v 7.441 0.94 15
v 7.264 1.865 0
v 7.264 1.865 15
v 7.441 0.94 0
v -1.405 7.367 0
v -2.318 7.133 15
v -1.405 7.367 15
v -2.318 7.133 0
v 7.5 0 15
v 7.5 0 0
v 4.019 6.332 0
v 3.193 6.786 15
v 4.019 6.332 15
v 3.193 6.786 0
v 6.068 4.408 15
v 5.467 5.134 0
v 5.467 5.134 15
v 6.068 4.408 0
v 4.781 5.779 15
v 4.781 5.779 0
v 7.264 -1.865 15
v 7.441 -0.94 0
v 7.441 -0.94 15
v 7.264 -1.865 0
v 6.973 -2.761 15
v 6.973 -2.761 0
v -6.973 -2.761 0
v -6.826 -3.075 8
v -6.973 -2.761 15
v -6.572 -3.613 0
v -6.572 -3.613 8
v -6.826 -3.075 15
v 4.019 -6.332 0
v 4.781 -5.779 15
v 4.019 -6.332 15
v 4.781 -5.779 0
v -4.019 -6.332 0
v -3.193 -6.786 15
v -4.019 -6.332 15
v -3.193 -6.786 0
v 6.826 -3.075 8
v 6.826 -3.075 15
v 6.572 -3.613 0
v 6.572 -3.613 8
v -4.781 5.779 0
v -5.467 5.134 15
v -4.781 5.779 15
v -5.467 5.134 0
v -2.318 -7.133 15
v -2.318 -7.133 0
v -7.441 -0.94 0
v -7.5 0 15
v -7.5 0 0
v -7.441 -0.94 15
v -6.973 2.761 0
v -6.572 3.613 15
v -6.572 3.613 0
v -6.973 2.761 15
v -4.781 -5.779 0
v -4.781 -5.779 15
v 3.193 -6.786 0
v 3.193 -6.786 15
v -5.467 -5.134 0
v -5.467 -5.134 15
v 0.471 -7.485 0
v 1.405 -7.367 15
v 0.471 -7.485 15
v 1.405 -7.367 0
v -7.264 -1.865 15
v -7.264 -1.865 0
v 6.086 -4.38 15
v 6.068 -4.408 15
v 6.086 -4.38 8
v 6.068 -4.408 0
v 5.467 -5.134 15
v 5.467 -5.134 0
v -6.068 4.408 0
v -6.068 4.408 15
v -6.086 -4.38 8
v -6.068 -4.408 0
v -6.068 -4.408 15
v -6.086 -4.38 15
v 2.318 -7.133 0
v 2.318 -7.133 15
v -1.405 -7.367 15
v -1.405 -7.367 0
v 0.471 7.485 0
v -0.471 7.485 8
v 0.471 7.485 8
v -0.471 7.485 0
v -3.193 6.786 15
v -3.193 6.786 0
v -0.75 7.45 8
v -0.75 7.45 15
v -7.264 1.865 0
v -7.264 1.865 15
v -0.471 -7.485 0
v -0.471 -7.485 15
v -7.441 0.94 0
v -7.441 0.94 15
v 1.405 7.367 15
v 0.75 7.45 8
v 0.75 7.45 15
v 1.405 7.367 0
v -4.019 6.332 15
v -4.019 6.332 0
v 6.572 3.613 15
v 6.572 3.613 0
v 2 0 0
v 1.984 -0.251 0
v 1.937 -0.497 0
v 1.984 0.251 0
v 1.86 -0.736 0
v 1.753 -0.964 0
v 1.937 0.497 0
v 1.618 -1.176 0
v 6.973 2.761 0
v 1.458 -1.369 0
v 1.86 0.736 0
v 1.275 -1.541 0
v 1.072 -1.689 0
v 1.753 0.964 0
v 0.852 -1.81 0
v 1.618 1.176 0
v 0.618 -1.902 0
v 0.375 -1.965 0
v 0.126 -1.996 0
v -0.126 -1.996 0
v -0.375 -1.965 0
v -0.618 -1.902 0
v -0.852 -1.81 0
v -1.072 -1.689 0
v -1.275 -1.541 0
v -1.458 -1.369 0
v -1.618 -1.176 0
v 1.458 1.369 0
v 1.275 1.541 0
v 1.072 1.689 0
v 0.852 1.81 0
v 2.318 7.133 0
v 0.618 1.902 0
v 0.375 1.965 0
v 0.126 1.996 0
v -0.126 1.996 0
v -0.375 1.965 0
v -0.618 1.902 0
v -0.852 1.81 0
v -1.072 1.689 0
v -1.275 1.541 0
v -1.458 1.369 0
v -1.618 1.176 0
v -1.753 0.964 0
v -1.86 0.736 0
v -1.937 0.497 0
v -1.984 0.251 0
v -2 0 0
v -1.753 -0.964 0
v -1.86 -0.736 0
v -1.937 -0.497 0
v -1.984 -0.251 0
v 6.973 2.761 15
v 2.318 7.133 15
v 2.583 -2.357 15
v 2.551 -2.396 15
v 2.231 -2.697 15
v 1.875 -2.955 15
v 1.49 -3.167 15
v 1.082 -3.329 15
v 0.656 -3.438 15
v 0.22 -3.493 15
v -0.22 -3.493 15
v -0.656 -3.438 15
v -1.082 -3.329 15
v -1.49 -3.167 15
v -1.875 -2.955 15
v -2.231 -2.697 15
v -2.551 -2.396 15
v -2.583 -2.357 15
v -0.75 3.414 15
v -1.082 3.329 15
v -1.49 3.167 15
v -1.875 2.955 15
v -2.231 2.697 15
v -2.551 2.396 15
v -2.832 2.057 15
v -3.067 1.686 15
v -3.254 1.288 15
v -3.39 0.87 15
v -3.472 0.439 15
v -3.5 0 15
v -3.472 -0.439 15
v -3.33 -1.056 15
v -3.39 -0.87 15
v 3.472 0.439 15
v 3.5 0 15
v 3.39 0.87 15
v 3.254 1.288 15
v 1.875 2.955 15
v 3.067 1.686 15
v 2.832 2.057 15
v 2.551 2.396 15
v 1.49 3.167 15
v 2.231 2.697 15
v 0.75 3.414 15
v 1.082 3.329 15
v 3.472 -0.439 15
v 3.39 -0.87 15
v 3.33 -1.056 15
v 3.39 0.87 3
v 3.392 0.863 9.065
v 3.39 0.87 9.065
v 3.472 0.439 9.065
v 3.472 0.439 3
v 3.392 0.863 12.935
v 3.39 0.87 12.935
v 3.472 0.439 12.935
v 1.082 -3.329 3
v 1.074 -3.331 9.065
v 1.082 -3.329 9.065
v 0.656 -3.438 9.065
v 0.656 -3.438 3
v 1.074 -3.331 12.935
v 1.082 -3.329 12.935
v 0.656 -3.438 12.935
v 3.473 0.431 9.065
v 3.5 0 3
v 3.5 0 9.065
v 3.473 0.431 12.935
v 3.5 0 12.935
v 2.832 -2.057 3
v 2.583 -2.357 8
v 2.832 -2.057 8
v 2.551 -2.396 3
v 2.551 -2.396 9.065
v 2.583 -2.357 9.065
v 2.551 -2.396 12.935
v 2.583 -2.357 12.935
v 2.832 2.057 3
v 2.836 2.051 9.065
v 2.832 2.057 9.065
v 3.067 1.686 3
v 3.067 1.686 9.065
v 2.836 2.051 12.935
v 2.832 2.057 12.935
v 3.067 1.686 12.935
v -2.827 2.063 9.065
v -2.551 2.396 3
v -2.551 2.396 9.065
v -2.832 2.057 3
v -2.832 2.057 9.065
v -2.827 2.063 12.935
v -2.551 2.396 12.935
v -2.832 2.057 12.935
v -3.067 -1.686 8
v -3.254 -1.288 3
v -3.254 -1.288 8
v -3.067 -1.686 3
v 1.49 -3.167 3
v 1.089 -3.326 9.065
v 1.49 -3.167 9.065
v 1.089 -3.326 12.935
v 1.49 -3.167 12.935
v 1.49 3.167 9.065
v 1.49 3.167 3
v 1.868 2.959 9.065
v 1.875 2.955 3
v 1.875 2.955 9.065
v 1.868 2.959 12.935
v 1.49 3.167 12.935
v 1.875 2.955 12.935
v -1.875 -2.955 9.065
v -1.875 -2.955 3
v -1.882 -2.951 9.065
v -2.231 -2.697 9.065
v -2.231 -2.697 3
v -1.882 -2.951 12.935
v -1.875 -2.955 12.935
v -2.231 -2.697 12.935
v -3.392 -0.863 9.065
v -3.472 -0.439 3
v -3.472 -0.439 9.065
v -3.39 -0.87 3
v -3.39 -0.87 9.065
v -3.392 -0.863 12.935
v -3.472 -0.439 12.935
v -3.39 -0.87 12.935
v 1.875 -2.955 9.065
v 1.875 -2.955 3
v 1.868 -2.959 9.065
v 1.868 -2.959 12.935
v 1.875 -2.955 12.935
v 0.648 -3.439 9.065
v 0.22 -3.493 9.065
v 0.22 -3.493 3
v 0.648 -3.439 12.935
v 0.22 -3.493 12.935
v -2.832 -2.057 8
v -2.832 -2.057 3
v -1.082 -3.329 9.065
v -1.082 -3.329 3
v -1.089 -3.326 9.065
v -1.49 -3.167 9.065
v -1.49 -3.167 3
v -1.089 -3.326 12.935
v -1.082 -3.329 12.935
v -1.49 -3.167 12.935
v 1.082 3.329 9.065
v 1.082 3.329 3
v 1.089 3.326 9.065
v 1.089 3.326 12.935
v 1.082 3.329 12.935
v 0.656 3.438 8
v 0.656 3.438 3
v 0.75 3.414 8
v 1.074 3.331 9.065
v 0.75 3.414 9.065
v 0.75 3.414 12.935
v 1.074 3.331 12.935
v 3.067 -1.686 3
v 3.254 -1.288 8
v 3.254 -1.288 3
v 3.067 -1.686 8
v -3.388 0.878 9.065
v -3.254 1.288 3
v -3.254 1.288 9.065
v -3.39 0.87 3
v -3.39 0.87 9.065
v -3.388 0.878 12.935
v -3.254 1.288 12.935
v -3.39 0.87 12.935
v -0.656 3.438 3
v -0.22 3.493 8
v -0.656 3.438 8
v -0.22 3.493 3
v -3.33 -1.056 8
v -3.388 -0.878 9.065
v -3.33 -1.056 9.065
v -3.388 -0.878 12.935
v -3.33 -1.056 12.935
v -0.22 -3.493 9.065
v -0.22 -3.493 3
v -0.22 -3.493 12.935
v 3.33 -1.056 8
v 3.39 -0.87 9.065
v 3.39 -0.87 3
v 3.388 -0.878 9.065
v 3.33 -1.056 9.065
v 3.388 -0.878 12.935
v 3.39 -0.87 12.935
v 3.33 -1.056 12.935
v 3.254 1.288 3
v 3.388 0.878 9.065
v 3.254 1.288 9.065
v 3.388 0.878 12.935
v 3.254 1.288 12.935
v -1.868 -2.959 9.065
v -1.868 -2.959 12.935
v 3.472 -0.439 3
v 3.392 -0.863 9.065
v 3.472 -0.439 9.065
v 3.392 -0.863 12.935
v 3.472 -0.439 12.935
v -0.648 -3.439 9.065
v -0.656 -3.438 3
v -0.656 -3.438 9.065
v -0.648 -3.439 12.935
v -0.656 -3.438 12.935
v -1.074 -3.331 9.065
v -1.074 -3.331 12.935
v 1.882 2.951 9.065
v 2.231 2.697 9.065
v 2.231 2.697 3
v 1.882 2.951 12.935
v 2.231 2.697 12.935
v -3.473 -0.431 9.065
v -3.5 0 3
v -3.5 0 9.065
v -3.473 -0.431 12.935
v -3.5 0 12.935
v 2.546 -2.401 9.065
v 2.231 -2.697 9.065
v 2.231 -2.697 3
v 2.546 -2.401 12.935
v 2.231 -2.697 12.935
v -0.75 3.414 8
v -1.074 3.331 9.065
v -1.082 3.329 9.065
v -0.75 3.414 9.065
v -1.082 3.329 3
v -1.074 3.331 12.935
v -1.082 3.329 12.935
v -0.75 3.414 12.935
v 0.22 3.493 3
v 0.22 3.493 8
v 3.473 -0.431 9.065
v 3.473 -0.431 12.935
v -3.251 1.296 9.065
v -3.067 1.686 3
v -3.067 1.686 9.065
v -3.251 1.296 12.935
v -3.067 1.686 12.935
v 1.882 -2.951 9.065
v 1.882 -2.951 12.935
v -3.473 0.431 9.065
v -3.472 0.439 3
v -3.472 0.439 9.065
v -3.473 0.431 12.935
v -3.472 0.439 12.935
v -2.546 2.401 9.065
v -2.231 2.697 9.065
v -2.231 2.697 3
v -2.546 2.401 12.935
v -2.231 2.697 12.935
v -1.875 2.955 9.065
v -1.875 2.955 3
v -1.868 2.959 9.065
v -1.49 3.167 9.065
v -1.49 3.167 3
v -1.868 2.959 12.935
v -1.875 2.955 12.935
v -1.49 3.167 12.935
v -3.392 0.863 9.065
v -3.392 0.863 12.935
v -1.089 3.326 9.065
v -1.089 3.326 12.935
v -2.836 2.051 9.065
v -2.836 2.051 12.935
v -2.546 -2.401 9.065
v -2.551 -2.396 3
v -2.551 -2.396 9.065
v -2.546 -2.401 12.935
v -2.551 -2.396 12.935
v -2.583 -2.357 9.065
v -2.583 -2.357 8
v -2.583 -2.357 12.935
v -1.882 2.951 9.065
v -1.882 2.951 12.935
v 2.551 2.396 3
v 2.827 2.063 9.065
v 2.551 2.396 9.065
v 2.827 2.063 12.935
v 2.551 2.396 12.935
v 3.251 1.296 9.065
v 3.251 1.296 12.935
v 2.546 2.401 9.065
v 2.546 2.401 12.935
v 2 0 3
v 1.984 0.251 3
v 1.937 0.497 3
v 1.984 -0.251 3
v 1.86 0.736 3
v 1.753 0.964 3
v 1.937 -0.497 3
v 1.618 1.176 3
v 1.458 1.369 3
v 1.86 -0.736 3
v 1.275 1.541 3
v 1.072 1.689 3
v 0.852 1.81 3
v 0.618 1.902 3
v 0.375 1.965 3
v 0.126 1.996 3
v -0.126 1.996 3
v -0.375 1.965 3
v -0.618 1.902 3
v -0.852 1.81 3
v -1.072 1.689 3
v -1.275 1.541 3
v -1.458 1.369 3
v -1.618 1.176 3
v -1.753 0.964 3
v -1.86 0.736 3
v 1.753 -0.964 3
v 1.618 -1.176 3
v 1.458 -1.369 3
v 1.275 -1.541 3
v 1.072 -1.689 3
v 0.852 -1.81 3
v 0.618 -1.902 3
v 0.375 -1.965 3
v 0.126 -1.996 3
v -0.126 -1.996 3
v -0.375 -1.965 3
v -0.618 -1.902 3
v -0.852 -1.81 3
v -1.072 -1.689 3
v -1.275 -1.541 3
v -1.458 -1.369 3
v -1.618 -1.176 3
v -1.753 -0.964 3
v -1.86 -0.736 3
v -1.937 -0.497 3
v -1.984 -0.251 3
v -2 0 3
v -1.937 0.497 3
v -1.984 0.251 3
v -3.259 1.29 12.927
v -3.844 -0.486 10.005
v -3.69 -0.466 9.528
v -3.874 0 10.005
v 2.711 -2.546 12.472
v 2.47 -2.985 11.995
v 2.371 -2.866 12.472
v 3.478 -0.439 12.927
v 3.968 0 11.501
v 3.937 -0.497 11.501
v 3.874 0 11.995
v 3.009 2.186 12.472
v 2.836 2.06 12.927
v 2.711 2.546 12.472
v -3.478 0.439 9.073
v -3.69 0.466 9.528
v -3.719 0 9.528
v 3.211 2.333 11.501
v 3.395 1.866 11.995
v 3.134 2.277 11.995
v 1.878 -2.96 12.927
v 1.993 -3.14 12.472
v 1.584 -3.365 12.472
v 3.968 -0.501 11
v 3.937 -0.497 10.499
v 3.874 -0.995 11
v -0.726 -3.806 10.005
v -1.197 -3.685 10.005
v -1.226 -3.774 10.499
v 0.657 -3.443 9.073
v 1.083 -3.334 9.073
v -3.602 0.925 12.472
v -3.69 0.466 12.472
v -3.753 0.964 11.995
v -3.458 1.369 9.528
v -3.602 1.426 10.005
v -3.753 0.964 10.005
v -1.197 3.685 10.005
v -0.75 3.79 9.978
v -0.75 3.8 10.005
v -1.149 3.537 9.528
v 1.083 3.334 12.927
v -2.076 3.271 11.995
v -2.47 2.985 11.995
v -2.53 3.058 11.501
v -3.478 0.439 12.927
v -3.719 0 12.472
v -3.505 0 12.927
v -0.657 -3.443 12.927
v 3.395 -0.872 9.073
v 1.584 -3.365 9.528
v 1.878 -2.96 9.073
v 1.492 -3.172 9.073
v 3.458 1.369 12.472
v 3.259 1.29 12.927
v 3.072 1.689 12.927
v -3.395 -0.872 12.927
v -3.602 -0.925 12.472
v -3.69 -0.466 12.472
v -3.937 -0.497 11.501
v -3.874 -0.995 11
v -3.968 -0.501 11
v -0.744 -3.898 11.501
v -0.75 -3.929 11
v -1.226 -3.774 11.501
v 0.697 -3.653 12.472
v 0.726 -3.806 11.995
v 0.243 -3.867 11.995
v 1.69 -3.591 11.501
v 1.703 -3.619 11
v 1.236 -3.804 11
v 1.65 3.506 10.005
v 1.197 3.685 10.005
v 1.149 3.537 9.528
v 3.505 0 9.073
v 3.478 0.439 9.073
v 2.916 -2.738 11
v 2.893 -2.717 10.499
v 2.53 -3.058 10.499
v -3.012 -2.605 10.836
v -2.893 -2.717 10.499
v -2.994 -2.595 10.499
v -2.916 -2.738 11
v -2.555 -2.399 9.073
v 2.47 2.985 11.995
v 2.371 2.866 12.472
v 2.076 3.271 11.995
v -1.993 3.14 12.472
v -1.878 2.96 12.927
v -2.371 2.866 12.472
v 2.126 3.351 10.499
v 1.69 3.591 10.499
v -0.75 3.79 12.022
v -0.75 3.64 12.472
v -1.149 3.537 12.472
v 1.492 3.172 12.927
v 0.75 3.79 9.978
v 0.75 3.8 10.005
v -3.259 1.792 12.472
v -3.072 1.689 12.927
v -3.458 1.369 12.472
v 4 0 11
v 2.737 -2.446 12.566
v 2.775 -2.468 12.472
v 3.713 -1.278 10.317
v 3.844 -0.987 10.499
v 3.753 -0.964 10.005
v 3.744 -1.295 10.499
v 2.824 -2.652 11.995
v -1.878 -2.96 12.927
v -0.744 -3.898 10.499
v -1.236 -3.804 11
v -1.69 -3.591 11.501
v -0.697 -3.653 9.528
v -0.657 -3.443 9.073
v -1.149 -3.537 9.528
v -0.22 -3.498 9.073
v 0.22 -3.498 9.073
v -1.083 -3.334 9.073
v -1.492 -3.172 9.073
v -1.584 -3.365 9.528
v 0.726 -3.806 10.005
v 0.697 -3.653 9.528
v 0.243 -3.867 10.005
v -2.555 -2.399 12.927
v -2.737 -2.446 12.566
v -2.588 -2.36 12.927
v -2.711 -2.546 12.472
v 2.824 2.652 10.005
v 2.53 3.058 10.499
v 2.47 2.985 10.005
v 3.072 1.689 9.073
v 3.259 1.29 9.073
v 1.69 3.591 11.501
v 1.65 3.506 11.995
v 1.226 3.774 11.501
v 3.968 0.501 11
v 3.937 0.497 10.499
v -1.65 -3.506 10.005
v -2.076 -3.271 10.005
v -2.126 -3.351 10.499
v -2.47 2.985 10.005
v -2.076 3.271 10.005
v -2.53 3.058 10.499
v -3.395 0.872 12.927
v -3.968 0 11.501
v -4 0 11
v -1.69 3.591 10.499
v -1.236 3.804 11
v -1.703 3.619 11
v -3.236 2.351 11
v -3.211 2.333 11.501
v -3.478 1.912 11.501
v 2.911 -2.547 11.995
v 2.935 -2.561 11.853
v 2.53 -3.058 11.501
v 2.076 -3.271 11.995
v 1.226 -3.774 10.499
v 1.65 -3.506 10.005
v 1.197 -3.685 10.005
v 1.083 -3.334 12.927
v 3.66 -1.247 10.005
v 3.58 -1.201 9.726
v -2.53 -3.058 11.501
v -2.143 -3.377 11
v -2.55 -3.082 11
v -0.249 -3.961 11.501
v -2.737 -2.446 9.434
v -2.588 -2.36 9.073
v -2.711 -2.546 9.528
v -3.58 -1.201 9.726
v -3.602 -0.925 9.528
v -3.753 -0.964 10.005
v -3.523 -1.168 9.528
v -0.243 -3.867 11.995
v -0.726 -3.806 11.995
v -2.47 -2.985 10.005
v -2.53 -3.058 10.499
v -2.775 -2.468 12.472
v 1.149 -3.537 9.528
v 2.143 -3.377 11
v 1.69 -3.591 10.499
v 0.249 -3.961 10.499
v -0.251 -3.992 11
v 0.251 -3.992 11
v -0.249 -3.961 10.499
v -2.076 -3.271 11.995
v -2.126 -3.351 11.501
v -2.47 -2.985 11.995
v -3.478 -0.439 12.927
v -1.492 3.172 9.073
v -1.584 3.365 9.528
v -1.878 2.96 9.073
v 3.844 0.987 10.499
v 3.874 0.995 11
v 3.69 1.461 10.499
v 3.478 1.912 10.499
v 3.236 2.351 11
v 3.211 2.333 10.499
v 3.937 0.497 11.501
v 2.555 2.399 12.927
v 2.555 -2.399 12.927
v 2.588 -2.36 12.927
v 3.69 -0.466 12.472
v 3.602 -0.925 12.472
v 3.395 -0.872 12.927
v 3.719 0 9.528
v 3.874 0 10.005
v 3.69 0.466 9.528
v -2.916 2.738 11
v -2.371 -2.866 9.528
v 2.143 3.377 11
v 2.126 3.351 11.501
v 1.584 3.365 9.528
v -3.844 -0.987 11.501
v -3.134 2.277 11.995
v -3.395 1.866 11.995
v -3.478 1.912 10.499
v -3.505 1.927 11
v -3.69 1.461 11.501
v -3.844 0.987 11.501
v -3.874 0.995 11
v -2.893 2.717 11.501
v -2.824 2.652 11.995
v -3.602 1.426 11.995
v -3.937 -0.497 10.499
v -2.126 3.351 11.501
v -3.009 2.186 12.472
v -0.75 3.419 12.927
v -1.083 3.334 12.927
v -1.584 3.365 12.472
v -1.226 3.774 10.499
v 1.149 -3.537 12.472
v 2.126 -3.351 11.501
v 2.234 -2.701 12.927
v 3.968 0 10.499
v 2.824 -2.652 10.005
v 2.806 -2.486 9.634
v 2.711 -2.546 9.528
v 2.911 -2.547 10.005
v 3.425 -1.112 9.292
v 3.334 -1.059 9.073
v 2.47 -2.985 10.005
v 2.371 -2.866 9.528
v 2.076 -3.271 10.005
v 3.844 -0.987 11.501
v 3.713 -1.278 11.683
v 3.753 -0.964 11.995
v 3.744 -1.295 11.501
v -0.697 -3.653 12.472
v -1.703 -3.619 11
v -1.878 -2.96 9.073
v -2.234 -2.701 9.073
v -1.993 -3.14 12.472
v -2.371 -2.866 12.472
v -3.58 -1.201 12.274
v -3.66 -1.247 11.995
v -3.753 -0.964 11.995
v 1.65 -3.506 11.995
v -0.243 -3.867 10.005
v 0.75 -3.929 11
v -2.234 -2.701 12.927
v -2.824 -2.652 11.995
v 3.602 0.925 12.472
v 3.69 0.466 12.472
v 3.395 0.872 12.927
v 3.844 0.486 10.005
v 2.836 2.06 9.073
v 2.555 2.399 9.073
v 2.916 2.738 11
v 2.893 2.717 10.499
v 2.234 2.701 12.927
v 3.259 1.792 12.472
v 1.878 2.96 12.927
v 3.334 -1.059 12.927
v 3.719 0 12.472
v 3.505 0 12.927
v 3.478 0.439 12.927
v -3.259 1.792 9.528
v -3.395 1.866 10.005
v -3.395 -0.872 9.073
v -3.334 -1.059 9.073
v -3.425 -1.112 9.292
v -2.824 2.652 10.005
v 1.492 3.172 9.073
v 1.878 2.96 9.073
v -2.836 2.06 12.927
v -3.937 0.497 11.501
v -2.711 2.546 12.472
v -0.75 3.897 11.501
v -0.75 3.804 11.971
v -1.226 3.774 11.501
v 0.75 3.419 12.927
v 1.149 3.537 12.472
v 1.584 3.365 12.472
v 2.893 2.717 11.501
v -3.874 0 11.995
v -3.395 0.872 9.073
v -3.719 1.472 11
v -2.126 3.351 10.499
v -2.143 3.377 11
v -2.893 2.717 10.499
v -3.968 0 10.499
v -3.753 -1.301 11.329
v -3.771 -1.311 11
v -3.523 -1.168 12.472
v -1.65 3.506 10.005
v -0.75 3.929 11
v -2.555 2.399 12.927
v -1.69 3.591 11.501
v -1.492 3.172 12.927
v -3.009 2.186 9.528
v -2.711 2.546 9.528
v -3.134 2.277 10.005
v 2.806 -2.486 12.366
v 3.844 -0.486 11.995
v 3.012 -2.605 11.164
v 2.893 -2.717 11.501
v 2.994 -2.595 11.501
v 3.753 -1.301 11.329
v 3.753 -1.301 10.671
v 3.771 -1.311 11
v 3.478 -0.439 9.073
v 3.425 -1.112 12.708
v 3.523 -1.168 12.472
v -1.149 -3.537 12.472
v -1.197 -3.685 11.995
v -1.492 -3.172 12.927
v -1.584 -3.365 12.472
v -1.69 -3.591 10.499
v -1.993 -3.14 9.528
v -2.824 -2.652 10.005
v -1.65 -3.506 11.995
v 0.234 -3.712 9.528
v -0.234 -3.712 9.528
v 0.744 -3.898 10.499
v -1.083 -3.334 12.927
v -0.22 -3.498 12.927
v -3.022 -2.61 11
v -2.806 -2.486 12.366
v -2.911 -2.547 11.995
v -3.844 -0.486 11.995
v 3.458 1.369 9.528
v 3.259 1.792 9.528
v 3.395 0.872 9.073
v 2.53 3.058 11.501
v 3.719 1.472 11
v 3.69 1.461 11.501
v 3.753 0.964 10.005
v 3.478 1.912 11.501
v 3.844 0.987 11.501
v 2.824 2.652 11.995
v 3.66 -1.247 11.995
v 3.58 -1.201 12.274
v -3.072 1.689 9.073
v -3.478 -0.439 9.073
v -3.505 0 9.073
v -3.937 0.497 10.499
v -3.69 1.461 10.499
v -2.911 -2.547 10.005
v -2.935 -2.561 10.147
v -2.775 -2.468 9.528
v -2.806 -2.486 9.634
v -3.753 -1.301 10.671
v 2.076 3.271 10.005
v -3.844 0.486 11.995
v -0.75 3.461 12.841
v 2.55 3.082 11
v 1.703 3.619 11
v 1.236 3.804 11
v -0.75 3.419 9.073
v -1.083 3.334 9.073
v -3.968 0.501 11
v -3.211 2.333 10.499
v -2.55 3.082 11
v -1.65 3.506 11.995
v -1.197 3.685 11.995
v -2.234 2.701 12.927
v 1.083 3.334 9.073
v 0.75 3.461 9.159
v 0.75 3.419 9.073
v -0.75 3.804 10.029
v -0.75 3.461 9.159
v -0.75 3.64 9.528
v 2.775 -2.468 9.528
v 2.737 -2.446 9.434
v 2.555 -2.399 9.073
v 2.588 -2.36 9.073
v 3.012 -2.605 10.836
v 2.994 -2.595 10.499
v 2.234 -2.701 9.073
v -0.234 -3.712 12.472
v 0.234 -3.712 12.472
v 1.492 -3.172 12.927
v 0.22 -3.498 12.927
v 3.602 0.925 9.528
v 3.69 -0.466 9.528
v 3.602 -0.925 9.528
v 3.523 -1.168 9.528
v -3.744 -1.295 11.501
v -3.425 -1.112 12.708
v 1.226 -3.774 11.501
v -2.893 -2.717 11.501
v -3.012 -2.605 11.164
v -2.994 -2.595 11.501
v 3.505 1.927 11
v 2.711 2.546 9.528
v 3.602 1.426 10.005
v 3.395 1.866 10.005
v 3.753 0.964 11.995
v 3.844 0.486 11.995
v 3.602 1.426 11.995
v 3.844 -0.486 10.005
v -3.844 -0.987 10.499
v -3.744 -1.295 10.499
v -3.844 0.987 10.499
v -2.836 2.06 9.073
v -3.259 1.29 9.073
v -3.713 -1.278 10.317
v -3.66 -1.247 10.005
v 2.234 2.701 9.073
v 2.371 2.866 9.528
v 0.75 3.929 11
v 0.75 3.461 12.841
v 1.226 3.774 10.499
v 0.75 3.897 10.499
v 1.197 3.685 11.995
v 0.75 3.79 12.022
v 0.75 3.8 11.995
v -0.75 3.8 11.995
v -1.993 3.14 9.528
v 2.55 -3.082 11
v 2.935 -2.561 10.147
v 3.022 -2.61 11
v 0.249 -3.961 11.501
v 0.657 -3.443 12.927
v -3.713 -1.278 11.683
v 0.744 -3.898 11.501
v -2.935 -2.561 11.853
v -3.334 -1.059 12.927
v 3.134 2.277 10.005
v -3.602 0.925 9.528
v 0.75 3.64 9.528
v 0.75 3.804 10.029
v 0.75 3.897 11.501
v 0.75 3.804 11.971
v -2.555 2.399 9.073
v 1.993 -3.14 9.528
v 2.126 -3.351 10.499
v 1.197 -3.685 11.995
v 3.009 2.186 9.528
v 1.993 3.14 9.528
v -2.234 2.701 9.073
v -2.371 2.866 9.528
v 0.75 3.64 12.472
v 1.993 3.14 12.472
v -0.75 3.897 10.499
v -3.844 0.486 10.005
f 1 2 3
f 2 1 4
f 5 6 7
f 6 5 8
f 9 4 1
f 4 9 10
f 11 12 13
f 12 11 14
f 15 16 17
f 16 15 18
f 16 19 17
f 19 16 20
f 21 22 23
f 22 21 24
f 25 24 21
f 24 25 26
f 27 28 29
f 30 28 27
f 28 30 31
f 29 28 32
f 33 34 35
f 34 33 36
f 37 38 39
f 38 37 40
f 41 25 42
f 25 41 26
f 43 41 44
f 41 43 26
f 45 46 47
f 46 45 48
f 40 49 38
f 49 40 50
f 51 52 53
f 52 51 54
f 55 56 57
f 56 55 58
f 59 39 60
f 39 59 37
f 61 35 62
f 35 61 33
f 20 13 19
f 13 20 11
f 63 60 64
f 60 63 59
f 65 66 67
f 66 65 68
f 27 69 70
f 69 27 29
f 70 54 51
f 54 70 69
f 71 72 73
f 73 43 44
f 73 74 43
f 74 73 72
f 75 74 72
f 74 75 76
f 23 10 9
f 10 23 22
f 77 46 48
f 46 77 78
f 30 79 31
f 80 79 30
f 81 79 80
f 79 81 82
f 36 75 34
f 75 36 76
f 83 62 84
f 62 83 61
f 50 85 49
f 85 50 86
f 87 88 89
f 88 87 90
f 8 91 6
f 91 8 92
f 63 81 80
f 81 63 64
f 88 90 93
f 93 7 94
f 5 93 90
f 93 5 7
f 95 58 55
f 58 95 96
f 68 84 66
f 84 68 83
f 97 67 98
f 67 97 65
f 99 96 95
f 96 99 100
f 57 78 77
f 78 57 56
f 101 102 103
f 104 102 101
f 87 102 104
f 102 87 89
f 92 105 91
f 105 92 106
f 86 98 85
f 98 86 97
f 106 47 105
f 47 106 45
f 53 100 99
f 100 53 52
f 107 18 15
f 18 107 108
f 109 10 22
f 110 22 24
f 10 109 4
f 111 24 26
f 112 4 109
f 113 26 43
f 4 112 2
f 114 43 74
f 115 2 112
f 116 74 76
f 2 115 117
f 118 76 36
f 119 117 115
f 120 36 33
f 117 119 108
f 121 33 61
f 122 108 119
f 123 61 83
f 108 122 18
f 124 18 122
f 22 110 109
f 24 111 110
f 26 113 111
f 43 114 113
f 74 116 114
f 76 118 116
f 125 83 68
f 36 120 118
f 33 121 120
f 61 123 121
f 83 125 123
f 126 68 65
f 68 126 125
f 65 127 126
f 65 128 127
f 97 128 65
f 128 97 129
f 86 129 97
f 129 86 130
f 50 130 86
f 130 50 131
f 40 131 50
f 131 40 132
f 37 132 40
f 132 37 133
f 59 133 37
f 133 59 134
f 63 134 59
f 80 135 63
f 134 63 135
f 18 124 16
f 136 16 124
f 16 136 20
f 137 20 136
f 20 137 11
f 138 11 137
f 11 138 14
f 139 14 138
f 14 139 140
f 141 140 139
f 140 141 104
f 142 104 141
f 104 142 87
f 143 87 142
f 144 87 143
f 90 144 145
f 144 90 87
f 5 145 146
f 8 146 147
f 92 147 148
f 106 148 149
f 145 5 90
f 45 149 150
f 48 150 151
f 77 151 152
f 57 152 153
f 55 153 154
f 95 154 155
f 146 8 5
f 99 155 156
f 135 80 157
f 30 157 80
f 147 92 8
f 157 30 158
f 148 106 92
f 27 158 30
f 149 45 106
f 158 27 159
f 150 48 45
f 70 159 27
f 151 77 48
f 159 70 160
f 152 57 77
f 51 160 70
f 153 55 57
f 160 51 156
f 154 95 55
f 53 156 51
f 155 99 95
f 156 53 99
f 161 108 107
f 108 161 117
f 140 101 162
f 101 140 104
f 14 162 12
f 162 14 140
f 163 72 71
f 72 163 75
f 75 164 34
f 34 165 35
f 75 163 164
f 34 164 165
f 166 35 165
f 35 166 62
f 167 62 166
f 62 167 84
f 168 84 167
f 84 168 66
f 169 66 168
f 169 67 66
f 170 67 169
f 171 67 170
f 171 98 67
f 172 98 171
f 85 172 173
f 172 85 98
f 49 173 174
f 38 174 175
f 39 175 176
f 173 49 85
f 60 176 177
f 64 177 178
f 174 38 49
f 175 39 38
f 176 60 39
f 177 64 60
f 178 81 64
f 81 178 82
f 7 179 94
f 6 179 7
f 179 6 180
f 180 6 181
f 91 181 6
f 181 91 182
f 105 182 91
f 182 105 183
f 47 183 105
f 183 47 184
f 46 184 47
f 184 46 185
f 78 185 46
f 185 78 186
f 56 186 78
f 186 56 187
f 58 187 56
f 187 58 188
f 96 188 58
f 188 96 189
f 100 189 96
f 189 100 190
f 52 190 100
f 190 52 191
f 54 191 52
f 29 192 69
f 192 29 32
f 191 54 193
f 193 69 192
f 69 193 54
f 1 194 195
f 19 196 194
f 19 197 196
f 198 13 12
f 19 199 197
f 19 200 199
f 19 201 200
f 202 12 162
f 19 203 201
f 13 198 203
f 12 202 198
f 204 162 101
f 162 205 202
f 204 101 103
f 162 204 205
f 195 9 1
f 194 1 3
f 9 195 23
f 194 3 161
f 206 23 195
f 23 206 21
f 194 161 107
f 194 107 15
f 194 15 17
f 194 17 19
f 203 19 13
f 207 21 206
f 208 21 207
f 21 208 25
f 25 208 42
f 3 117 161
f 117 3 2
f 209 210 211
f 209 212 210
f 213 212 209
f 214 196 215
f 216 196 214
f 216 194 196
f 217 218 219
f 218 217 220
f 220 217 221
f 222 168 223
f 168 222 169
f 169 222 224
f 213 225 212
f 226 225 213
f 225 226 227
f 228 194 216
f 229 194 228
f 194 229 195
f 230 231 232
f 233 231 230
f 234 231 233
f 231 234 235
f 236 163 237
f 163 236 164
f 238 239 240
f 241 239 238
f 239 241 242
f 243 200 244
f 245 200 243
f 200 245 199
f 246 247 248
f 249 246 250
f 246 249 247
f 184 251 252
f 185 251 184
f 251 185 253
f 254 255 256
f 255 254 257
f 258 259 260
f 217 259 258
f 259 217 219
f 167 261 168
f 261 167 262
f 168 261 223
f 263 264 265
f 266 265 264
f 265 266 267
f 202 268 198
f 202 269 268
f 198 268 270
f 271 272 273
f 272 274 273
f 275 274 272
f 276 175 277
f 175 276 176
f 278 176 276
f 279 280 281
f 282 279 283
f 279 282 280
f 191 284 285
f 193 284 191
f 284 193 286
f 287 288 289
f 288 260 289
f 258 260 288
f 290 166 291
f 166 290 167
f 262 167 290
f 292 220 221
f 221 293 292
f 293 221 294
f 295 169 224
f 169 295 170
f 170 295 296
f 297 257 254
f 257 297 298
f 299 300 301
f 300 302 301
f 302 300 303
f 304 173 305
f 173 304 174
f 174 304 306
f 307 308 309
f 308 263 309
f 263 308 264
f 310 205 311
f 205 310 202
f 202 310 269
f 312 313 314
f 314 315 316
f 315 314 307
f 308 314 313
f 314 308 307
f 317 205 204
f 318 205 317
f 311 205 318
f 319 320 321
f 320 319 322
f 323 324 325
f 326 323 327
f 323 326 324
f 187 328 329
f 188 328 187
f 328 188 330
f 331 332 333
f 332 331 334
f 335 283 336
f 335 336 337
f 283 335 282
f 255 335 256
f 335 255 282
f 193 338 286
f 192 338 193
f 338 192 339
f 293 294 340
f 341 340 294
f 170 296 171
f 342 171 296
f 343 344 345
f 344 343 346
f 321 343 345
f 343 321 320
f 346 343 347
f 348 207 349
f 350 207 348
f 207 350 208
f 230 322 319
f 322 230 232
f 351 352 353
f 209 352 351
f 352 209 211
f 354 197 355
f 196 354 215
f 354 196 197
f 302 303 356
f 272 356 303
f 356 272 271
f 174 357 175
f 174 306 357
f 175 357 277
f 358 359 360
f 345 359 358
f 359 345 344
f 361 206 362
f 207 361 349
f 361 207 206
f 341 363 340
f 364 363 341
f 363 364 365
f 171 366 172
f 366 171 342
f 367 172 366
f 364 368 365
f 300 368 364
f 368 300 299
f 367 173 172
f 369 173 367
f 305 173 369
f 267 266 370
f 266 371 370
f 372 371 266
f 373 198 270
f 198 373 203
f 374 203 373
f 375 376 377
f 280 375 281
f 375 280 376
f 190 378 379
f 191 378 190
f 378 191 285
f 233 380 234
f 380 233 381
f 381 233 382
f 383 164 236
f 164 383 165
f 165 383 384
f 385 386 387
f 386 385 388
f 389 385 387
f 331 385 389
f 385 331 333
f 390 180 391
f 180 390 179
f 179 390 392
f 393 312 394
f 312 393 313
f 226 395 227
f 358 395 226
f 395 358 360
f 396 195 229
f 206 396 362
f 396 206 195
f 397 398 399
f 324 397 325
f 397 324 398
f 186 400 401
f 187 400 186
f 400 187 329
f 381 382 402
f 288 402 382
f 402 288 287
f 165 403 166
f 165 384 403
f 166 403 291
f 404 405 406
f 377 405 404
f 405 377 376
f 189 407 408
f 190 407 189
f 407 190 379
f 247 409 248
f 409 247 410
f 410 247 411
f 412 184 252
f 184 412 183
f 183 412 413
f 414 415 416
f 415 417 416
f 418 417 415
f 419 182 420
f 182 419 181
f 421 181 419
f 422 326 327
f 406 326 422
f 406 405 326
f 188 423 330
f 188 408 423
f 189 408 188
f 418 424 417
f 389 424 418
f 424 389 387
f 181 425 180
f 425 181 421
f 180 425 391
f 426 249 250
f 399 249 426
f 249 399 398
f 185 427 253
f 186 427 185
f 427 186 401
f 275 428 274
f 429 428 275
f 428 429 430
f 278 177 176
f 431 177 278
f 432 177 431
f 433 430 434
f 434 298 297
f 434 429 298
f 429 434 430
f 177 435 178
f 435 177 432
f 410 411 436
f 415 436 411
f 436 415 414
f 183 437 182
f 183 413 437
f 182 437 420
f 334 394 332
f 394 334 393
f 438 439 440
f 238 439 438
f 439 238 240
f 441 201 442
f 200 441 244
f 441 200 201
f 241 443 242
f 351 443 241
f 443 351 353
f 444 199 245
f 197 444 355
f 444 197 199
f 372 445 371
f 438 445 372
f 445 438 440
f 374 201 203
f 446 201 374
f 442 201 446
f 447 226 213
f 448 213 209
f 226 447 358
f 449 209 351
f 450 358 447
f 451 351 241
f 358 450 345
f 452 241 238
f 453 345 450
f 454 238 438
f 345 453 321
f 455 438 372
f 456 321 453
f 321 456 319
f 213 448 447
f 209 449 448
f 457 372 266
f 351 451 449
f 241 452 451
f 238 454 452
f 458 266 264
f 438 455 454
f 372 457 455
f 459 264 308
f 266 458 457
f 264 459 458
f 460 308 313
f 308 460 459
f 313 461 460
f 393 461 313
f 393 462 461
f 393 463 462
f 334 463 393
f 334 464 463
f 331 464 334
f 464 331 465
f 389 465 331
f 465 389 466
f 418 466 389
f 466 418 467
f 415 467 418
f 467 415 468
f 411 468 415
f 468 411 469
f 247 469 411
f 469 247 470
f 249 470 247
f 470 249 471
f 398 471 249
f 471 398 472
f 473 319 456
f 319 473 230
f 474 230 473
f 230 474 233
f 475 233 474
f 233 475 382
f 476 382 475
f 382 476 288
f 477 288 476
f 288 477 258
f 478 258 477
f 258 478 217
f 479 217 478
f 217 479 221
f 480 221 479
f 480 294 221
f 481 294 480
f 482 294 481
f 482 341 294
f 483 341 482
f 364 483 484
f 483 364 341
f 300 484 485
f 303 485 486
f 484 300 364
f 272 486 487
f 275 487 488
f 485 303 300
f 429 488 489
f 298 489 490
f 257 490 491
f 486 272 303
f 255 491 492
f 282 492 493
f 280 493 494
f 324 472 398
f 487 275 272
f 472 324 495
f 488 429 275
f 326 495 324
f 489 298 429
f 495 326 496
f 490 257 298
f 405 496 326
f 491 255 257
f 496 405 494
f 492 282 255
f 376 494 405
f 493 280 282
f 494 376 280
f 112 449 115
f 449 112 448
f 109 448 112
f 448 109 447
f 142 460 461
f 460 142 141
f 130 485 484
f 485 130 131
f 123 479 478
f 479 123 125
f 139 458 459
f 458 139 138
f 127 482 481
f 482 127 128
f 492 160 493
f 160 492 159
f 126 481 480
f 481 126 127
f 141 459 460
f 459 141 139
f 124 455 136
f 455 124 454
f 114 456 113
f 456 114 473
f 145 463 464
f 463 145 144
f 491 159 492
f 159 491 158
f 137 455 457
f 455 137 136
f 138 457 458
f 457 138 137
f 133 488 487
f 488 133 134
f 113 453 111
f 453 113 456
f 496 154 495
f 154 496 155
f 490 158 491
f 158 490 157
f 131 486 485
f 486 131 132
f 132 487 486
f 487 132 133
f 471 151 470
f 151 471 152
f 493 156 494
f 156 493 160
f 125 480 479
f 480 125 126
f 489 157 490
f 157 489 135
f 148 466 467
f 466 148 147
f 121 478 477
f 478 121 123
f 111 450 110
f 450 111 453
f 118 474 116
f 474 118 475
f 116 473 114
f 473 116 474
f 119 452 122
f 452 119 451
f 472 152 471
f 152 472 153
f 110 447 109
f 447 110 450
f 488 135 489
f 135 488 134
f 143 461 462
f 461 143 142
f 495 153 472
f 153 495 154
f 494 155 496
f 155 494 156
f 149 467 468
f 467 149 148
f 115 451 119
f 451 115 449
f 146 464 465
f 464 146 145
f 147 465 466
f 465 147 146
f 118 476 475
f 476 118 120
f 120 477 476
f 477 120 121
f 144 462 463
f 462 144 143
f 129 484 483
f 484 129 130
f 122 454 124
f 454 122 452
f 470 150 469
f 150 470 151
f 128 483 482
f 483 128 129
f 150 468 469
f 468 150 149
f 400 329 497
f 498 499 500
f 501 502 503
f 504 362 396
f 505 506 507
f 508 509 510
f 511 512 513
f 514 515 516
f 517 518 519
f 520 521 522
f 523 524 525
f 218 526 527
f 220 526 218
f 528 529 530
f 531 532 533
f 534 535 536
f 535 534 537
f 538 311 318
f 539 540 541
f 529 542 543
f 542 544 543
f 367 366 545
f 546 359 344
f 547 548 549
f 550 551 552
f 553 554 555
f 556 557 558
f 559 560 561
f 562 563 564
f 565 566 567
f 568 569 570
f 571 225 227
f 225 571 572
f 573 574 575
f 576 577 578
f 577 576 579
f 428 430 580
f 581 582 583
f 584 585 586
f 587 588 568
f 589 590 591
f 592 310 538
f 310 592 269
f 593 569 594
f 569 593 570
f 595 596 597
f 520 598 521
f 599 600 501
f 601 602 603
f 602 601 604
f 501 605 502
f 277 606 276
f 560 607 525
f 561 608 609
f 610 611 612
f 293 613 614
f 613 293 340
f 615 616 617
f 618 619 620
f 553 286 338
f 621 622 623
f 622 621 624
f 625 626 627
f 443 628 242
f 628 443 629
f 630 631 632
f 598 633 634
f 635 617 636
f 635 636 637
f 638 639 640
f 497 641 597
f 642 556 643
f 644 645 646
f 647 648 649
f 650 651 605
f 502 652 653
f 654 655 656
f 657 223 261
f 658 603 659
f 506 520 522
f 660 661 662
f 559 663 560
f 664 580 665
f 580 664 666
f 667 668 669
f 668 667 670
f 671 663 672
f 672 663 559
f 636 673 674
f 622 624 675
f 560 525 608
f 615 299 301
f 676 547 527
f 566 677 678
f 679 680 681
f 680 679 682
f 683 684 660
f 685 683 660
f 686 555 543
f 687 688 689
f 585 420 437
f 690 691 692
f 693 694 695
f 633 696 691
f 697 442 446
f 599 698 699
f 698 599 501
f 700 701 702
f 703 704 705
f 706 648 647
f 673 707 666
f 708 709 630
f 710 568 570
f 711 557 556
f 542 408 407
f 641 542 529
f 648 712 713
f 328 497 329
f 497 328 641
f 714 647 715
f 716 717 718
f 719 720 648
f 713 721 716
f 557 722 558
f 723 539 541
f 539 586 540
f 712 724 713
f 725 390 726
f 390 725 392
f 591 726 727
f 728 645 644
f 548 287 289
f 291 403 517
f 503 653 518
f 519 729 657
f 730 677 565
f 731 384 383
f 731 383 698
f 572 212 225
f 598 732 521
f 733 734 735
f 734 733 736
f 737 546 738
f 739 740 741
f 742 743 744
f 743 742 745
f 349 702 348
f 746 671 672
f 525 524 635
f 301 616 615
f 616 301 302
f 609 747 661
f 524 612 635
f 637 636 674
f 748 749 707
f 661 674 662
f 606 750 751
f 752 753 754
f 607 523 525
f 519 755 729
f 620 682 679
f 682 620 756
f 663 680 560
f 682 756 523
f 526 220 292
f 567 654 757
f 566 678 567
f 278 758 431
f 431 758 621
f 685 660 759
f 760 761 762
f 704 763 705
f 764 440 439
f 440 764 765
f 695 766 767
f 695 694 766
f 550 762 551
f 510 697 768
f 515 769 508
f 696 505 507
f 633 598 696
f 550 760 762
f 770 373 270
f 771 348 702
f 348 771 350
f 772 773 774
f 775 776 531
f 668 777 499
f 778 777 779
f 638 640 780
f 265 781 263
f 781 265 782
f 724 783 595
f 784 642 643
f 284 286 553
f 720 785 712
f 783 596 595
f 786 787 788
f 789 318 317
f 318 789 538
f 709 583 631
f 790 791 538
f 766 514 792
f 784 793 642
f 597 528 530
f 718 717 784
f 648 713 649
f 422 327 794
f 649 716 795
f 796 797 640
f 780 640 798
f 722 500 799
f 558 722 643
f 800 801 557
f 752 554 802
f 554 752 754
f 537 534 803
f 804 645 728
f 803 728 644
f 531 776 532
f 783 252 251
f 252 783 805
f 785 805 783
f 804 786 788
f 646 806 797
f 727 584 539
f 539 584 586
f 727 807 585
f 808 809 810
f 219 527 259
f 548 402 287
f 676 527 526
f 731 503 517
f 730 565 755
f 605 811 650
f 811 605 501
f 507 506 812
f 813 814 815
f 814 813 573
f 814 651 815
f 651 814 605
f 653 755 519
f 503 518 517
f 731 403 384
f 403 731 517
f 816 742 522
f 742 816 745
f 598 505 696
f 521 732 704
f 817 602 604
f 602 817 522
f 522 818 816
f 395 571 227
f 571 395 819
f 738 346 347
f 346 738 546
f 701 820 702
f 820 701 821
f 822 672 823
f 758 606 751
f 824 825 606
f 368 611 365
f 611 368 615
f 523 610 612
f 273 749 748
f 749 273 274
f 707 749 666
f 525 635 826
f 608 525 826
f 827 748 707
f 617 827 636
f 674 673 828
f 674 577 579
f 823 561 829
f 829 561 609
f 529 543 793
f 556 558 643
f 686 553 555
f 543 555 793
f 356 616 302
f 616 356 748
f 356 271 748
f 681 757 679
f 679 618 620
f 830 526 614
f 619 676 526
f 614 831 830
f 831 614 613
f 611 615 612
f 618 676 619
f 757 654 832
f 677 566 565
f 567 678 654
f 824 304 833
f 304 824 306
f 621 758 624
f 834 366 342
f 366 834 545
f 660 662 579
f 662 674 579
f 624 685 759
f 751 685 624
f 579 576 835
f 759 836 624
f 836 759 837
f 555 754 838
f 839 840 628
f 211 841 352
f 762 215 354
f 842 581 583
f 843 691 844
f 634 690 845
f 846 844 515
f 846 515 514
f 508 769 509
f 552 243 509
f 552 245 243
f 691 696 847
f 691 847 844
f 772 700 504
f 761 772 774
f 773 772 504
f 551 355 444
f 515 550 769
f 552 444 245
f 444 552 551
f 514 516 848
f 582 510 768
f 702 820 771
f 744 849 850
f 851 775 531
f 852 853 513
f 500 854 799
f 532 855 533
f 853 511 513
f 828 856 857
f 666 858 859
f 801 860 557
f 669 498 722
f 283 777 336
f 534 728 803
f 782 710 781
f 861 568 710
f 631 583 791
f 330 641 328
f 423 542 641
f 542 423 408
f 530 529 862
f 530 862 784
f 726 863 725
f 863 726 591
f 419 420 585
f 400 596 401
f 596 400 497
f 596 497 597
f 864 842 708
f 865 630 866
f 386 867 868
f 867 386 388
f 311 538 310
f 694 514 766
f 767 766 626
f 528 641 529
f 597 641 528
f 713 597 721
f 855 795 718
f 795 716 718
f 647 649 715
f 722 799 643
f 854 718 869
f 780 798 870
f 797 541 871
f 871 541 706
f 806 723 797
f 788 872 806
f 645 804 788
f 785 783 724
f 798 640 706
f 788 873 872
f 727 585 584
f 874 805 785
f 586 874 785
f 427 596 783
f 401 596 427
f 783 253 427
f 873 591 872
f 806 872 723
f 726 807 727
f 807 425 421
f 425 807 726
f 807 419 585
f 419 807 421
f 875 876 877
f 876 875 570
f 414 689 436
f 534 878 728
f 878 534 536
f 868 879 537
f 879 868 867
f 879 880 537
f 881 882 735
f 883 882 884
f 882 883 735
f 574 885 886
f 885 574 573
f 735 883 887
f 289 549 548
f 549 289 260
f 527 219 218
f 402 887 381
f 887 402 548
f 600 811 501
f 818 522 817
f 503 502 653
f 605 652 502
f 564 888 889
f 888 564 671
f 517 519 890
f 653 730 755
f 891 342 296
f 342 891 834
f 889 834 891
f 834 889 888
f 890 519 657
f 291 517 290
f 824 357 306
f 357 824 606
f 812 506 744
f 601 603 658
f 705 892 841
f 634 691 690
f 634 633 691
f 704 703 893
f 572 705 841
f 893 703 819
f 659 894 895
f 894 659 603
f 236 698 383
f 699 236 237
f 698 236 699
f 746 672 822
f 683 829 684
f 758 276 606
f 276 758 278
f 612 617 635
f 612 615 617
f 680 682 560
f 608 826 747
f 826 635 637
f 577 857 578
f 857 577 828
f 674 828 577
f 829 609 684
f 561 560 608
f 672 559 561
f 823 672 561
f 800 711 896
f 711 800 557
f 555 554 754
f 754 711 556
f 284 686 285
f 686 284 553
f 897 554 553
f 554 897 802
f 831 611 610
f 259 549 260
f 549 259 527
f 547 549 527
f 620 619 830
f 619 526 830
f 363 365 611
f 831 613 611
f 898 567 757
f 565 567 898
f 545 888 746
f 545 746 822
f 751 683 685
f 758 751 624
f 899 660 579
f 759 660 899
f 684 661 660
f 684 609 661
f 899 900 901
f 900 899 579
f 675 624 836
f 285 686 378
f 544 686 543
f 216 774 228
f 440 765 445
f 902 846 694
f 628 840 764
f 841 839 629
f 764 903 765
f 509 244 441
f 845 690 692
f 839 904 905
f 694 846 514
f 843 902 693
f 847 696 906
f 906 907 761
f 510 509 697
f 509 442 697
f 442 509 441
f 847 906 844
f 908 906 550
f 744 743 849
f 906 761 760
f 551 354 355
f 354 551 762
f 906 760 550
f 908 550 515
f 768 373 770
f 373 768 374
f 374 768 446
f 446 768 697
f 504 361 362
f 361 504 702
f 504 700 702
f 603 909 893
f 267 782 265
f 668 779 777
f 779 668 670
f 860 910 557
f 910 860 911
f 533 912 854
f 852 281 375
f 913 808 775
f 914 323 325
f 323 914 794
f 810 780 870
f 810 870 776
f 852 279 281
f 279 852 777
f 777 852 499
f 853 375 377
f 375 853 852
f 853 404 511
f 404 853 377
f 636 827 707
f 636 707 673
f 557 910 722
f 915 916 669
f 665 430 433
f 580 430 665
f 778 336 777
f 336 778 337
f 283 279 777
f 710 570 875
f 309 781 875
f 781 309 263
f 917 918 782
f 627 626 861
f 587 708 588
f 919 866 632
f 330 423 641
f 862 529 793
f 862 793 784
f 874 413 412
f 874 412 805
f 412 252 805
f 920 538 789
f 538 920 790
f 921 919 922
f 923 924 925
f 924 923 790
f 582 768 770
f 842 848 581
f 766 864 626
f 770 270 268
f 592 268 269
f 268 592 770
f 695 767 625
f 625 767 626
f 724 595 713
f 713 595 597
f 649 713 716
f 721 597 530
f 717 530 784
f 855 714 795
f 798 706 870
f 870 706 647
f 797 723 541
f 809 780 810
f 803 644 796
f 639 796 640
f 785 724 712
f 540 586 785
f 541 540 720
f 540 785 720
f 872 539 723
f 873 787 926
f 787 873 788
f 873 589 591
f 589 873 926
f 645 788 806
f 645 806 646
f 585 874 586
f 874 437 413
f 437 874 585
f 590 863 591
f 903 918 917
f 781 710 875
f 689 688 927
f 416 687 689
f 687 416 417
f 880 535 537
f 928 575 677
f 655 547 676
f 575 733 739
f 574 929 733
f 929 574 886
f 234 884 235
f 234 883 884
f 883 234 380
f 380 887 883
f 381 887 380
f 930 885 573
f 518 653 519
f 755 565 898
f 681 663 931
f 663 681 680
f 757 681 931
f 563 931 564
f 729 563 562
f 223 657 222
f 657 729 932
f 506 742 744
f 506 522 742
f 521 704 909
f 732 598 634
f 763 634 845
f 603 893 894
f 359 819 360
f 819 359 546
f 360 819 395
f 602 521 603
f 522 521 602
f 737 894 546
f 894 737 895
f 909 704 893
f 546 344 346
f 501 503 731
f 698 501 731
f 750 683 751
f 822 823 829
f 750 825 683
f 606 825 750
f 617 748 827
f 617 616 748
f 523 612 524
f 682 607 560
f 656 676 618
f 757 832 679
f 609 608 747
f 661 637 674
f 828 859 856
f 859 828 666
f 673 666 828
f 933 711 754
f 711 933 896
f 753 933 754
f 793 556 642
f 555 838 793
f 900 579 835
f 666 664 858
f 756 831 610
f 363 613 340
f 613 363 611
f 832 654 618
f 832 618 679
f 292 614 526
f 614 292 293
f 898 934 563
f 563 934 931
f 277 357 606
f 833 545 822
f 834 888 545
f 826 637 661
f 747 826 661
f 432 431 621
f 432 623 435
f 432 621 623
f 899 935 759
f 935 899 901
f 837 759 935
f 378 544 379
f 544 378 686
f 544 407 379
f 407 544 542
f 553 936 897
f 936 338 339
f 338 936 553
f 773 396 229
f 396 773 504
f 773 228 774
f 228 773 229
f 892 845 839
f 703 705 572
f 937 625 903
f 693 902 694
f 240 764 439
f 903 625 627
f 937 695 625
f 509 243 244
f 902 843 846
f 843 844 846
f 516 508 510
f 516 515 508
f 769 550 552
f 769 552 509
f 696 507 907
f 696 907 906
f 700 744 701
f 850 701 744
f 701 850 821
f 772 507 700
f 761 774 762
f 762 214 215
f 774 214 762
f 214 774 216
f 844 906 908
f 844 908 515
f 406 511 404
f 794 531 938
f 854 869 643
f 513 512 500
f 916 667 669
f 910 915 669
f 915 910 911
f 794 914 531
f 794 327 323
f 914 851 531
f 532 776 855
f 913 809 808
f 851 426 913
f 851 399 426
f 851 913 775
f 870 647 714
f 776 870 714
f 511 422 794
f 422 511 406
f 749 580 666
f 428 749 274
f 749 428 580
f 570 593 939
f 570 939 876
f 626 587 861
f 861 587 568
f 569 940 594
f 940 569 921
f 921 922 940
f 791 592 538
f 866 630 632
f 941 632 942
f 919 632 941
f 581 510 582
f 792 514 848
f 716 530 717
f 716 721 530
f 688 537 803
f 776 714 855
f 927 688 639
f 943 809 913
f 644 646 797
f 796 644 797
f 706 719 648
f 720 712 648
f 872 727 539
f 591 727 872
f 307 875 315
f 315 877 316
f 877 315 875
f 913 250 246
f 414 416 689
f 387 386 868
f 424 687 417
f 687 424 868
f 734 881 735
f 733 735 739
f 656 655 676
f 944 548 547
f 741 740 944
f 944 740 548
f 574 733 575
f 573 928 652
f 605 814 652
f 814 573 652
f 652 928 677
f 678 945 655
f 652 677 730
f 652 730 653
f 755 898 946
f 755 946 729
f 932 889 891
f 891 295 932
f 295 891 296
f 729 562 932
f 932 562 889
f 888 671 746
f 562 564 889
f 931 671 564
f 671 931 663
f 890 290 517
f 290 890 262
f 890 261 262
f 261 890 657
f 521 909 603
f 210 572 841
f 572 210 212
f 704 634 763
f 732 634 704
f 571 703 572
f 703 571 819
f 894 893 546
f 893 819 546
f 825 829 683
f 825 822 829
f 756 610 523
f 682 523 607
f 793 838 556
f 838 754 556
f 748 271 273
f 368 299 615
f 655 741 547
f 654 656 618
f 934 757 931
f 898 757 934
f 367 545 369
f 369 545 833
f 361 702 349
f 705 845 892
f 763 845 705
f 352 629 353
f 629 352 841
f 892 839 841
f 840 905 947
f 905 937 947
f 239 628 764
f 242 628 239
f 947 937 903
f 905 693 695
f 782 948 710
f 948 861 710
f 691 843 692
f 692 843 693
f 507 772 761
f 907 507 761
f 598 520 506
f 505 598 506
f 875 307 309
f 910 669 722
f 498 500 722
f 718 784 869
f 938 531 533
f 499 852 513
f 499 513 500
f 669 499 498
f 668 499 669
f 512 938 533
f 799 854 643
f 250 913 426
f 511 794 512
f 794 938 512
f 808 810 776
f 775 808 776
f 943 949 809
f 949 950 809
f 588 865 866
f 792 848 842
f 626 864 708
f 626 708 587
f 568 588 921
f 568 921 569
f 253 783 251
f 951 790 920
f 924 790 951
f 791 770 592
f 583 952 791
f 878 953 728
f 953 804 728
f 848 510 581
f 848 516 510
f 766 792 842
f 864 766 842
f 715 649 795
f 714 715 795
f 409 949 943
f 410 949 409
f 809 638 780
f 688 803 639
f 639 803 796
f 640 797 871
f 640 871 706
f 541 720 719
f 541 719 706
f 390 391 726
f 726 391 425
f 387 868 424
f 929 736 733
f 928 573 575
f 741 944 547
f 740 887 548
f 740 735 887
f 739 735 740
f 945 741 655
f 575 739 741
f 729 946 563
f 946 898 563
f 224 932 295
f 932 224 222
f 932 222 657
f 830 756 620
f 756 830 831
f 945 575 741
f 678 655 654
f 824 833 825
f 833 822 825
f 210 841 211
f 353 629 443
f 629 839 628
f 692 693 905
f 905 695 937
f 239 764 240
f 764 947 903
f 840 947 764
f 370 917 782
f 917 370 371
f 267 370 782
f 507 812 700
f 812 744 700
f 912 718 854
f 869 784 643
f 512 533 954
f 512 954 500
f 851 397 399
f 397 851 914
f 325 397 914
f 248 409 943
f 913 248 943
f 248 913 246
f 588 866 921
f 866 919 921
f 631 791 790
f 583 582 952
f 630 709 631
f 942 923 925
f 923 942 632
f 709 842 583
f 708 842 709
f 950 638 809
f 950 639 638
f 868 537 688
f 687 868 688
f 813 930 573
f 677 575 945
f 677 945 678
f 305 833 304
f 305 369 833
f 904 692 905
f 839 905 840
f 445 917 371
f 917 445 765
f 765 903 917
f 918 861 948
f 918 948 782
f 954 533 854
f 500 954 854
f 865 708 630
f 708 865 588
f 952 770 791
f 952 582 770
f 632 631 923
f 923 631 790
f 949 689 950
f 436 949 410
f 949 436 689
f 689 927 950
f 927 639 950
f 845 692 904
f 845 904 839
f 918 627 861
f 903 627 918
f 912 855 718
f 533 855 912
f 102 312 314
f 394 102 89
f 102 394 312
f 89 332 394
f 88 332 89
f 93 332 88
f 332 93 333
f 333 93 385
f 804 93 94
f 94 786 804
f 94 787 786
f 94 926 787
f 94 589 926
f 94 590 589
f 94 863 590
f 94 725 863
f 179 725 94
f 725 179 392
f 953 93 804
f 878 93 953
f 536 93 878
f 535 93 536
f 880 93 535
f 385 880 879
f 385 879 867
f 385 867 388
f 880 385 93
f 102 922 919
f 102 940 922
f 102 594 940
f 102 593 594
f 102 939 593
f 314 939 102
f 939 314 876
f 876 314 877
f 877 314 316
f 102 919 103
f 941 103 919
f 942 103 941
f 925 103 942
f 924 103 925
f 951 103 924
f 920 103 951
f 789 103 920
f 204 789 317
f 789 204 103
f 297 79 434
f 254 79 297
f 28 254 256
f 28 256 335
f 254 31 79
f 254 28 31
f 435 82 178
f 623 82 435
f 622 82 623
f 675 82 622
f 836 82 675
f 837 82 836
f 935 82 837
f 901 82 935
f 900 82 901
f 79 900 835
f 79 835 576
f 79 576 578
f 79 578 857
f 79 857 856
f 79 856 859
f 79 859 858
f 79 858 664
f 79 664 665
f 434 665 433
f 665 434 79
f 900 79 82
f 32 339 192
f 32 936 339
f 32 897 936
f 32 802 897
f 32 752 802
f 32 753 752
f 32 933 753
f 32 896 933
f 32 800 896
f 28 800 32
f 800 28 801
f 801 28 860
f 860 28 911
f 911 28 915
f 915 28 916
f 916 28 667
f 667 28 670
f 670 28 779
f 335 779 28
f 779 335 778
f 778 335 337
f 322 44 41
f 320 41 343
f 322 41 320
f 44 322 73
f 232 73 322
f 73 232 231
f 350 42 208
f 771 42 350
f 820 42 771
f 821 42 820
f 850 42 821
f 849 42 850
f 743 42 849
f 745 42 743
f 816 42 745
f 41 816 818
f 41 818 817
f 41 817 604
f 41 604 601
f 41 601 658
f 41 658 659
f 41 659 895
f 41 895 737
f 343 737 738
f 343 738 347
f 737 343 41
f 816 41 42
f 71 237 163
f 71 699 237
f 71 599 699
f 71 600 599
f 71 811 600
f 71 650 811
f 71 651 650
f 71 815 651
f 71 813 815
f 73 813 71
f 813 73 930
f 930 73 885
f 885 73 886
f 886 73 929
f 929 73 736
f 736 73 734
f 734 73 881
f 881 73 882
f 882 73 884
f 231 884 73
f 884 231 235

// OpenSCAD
height = 15;
thickness = 3;

sphere_d = 8;
sphere_pos = [
    0,
    0,
    height - sphere_d/2
];

cut_size = [1.5, 5, 7];


size = [15, 15/2];

cut_cylinder1_size = [15, 7/2];
cut_cylinder1_pos = [
    0,
    0,
    thickness
];

cut_cylinder2_size = [15, 4/2];
cut_cylinder2_pos = [
    0,
    0,
    -thickness
];



$fn = 50;


module cylinder_(size_) {
    linear_extrude(height=size_.x)
    circle(size_.y);
};


module cut() {
    translate([
        0,
        (size.x-cut_size.y)/2,
        height-cut_size.z
    ])
    linear_extrude(height=cut_size.z)
    square([cut_size.x, cut_size.y] , center=true);
};


difference() {
    cylinder_(size);
    
    translate(cut_cylinder1_pos)
    cylinder_(cut_cylinder1_size);
    
    translate(cut_cylinder2_pos)
    cylinder_(cut_cylinder2_size);
    
    translate(sphere_pos)
    sphere(sphere_d/2);
    
    cut();
    rotate(
        [
            0,
            0,
            120
        ]
    )
    cut();
    rotate(
        [
            0,
            0,
            240
        ]
    )
    cut();
};
